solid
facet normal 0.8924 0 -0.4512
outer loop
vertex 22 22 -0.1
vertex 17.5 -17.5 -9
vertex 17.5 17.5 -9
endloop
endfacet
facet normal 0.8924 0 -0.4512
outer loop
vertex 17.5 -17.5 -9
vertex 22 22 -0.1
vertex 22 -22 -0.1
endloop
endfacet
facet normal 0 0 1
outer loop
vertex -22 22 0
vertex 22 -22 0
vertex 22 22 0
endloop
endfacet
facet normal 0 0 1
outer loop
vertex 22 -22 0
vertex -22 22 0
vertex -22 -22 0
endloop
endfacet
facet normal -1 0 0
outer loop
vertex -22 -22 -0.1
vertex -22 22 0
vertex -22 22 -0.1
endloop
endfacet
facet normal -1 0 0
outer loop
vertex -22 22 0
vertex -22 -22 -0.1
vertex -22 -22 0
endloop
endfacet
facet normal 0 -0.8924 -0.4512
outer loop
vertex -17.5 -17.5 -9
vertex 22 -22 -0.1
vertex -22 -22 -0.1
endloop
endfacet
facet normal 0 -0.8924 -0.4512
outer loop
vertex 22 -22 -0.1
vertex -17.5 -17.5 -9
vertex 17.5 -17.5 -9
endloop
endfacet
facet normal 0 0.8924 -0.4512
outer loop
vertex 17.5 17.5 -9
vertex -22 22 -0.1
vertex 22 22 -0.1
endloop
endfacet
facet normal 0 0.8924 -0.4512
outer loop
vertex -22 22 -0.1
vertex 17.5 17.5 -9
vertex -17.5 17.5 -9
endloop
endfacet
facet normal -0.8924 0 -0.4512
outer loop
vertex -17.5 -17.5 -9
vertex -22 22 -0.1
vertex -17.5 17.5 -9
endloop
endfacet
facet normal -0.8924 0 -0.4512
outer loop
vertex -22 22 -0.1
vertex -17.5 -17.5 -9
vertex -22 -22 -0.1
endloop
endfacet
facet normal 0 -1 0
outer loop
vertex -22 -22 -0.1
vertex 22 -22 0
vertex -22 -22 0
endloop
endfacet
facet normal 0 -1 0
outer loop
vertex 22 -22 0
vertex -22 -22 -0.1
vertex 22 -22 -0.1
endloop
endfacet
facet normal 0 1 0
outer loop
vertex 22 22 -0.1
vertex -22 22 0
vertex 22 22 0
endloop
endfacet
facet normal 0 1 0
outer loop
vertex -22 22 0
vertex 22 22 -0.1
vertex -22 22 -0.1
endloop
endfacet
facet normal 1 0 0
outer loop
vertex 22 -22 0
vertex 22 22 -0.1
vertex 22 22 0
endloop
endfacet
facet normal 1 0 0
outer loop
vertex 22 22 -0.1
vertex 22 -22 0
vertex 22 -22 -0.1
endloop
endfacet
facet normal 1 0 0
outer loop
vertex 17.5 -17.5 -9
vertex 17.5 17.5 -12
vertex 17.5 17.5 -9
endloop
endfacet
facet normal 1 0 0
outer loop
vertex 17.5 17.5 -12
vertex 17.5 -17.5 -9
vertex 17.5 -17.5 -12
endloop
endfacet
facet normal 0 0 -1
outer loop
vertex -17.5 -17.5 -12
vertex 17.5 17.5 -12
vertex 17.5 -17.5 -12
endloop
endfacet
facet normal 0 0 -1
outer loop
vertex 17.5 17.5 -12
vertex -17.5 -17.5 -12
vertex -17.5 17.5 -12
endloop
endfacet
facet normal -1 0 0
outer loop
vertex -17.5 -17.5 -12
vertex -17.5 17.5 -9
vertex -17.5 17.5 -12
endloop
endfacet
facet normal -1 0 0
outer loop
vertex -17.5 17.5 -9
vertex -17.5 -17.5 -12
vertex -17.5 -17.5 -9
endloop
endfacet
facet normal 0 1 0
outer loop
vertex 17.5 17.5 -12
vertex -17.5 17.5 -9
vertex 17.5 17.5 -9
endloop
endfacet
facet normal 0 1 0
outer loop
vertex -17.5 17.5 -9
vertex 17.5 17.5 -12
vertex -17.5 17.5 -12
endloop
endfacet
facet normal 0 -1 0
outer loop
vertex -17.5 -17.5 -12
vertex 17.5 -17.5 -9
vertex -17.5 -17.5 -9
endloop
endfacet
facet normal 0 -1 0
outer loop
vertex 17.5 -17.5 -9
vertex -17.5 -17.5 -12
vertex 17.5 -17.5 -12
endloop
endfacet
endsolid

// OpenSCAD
/*
    created 31 Jan 2021
    Modified to ver 2 
    by Matt Jones (Crazy-Logic)  
    This example code is in the public domain.
    
    This is for mounting tslot to a Hama tripod stand. 
*/

$d = 21;
UNCboltholeradius = 3.175;
UNCboltheadheight = 7;


difference() 
{
    union()
    {
        hull(){
        translate([-22,-22,-0.1])
            cube([44,44,0.1],false);
        translate([-17.5,-17.5,-9])
            cube([35,35,1],false);
        }
        //shelf bit 
        translate([-$d/2-7,-$d/2-7,-9-3])
            cube([35,35,3],false);
    }
    
}
